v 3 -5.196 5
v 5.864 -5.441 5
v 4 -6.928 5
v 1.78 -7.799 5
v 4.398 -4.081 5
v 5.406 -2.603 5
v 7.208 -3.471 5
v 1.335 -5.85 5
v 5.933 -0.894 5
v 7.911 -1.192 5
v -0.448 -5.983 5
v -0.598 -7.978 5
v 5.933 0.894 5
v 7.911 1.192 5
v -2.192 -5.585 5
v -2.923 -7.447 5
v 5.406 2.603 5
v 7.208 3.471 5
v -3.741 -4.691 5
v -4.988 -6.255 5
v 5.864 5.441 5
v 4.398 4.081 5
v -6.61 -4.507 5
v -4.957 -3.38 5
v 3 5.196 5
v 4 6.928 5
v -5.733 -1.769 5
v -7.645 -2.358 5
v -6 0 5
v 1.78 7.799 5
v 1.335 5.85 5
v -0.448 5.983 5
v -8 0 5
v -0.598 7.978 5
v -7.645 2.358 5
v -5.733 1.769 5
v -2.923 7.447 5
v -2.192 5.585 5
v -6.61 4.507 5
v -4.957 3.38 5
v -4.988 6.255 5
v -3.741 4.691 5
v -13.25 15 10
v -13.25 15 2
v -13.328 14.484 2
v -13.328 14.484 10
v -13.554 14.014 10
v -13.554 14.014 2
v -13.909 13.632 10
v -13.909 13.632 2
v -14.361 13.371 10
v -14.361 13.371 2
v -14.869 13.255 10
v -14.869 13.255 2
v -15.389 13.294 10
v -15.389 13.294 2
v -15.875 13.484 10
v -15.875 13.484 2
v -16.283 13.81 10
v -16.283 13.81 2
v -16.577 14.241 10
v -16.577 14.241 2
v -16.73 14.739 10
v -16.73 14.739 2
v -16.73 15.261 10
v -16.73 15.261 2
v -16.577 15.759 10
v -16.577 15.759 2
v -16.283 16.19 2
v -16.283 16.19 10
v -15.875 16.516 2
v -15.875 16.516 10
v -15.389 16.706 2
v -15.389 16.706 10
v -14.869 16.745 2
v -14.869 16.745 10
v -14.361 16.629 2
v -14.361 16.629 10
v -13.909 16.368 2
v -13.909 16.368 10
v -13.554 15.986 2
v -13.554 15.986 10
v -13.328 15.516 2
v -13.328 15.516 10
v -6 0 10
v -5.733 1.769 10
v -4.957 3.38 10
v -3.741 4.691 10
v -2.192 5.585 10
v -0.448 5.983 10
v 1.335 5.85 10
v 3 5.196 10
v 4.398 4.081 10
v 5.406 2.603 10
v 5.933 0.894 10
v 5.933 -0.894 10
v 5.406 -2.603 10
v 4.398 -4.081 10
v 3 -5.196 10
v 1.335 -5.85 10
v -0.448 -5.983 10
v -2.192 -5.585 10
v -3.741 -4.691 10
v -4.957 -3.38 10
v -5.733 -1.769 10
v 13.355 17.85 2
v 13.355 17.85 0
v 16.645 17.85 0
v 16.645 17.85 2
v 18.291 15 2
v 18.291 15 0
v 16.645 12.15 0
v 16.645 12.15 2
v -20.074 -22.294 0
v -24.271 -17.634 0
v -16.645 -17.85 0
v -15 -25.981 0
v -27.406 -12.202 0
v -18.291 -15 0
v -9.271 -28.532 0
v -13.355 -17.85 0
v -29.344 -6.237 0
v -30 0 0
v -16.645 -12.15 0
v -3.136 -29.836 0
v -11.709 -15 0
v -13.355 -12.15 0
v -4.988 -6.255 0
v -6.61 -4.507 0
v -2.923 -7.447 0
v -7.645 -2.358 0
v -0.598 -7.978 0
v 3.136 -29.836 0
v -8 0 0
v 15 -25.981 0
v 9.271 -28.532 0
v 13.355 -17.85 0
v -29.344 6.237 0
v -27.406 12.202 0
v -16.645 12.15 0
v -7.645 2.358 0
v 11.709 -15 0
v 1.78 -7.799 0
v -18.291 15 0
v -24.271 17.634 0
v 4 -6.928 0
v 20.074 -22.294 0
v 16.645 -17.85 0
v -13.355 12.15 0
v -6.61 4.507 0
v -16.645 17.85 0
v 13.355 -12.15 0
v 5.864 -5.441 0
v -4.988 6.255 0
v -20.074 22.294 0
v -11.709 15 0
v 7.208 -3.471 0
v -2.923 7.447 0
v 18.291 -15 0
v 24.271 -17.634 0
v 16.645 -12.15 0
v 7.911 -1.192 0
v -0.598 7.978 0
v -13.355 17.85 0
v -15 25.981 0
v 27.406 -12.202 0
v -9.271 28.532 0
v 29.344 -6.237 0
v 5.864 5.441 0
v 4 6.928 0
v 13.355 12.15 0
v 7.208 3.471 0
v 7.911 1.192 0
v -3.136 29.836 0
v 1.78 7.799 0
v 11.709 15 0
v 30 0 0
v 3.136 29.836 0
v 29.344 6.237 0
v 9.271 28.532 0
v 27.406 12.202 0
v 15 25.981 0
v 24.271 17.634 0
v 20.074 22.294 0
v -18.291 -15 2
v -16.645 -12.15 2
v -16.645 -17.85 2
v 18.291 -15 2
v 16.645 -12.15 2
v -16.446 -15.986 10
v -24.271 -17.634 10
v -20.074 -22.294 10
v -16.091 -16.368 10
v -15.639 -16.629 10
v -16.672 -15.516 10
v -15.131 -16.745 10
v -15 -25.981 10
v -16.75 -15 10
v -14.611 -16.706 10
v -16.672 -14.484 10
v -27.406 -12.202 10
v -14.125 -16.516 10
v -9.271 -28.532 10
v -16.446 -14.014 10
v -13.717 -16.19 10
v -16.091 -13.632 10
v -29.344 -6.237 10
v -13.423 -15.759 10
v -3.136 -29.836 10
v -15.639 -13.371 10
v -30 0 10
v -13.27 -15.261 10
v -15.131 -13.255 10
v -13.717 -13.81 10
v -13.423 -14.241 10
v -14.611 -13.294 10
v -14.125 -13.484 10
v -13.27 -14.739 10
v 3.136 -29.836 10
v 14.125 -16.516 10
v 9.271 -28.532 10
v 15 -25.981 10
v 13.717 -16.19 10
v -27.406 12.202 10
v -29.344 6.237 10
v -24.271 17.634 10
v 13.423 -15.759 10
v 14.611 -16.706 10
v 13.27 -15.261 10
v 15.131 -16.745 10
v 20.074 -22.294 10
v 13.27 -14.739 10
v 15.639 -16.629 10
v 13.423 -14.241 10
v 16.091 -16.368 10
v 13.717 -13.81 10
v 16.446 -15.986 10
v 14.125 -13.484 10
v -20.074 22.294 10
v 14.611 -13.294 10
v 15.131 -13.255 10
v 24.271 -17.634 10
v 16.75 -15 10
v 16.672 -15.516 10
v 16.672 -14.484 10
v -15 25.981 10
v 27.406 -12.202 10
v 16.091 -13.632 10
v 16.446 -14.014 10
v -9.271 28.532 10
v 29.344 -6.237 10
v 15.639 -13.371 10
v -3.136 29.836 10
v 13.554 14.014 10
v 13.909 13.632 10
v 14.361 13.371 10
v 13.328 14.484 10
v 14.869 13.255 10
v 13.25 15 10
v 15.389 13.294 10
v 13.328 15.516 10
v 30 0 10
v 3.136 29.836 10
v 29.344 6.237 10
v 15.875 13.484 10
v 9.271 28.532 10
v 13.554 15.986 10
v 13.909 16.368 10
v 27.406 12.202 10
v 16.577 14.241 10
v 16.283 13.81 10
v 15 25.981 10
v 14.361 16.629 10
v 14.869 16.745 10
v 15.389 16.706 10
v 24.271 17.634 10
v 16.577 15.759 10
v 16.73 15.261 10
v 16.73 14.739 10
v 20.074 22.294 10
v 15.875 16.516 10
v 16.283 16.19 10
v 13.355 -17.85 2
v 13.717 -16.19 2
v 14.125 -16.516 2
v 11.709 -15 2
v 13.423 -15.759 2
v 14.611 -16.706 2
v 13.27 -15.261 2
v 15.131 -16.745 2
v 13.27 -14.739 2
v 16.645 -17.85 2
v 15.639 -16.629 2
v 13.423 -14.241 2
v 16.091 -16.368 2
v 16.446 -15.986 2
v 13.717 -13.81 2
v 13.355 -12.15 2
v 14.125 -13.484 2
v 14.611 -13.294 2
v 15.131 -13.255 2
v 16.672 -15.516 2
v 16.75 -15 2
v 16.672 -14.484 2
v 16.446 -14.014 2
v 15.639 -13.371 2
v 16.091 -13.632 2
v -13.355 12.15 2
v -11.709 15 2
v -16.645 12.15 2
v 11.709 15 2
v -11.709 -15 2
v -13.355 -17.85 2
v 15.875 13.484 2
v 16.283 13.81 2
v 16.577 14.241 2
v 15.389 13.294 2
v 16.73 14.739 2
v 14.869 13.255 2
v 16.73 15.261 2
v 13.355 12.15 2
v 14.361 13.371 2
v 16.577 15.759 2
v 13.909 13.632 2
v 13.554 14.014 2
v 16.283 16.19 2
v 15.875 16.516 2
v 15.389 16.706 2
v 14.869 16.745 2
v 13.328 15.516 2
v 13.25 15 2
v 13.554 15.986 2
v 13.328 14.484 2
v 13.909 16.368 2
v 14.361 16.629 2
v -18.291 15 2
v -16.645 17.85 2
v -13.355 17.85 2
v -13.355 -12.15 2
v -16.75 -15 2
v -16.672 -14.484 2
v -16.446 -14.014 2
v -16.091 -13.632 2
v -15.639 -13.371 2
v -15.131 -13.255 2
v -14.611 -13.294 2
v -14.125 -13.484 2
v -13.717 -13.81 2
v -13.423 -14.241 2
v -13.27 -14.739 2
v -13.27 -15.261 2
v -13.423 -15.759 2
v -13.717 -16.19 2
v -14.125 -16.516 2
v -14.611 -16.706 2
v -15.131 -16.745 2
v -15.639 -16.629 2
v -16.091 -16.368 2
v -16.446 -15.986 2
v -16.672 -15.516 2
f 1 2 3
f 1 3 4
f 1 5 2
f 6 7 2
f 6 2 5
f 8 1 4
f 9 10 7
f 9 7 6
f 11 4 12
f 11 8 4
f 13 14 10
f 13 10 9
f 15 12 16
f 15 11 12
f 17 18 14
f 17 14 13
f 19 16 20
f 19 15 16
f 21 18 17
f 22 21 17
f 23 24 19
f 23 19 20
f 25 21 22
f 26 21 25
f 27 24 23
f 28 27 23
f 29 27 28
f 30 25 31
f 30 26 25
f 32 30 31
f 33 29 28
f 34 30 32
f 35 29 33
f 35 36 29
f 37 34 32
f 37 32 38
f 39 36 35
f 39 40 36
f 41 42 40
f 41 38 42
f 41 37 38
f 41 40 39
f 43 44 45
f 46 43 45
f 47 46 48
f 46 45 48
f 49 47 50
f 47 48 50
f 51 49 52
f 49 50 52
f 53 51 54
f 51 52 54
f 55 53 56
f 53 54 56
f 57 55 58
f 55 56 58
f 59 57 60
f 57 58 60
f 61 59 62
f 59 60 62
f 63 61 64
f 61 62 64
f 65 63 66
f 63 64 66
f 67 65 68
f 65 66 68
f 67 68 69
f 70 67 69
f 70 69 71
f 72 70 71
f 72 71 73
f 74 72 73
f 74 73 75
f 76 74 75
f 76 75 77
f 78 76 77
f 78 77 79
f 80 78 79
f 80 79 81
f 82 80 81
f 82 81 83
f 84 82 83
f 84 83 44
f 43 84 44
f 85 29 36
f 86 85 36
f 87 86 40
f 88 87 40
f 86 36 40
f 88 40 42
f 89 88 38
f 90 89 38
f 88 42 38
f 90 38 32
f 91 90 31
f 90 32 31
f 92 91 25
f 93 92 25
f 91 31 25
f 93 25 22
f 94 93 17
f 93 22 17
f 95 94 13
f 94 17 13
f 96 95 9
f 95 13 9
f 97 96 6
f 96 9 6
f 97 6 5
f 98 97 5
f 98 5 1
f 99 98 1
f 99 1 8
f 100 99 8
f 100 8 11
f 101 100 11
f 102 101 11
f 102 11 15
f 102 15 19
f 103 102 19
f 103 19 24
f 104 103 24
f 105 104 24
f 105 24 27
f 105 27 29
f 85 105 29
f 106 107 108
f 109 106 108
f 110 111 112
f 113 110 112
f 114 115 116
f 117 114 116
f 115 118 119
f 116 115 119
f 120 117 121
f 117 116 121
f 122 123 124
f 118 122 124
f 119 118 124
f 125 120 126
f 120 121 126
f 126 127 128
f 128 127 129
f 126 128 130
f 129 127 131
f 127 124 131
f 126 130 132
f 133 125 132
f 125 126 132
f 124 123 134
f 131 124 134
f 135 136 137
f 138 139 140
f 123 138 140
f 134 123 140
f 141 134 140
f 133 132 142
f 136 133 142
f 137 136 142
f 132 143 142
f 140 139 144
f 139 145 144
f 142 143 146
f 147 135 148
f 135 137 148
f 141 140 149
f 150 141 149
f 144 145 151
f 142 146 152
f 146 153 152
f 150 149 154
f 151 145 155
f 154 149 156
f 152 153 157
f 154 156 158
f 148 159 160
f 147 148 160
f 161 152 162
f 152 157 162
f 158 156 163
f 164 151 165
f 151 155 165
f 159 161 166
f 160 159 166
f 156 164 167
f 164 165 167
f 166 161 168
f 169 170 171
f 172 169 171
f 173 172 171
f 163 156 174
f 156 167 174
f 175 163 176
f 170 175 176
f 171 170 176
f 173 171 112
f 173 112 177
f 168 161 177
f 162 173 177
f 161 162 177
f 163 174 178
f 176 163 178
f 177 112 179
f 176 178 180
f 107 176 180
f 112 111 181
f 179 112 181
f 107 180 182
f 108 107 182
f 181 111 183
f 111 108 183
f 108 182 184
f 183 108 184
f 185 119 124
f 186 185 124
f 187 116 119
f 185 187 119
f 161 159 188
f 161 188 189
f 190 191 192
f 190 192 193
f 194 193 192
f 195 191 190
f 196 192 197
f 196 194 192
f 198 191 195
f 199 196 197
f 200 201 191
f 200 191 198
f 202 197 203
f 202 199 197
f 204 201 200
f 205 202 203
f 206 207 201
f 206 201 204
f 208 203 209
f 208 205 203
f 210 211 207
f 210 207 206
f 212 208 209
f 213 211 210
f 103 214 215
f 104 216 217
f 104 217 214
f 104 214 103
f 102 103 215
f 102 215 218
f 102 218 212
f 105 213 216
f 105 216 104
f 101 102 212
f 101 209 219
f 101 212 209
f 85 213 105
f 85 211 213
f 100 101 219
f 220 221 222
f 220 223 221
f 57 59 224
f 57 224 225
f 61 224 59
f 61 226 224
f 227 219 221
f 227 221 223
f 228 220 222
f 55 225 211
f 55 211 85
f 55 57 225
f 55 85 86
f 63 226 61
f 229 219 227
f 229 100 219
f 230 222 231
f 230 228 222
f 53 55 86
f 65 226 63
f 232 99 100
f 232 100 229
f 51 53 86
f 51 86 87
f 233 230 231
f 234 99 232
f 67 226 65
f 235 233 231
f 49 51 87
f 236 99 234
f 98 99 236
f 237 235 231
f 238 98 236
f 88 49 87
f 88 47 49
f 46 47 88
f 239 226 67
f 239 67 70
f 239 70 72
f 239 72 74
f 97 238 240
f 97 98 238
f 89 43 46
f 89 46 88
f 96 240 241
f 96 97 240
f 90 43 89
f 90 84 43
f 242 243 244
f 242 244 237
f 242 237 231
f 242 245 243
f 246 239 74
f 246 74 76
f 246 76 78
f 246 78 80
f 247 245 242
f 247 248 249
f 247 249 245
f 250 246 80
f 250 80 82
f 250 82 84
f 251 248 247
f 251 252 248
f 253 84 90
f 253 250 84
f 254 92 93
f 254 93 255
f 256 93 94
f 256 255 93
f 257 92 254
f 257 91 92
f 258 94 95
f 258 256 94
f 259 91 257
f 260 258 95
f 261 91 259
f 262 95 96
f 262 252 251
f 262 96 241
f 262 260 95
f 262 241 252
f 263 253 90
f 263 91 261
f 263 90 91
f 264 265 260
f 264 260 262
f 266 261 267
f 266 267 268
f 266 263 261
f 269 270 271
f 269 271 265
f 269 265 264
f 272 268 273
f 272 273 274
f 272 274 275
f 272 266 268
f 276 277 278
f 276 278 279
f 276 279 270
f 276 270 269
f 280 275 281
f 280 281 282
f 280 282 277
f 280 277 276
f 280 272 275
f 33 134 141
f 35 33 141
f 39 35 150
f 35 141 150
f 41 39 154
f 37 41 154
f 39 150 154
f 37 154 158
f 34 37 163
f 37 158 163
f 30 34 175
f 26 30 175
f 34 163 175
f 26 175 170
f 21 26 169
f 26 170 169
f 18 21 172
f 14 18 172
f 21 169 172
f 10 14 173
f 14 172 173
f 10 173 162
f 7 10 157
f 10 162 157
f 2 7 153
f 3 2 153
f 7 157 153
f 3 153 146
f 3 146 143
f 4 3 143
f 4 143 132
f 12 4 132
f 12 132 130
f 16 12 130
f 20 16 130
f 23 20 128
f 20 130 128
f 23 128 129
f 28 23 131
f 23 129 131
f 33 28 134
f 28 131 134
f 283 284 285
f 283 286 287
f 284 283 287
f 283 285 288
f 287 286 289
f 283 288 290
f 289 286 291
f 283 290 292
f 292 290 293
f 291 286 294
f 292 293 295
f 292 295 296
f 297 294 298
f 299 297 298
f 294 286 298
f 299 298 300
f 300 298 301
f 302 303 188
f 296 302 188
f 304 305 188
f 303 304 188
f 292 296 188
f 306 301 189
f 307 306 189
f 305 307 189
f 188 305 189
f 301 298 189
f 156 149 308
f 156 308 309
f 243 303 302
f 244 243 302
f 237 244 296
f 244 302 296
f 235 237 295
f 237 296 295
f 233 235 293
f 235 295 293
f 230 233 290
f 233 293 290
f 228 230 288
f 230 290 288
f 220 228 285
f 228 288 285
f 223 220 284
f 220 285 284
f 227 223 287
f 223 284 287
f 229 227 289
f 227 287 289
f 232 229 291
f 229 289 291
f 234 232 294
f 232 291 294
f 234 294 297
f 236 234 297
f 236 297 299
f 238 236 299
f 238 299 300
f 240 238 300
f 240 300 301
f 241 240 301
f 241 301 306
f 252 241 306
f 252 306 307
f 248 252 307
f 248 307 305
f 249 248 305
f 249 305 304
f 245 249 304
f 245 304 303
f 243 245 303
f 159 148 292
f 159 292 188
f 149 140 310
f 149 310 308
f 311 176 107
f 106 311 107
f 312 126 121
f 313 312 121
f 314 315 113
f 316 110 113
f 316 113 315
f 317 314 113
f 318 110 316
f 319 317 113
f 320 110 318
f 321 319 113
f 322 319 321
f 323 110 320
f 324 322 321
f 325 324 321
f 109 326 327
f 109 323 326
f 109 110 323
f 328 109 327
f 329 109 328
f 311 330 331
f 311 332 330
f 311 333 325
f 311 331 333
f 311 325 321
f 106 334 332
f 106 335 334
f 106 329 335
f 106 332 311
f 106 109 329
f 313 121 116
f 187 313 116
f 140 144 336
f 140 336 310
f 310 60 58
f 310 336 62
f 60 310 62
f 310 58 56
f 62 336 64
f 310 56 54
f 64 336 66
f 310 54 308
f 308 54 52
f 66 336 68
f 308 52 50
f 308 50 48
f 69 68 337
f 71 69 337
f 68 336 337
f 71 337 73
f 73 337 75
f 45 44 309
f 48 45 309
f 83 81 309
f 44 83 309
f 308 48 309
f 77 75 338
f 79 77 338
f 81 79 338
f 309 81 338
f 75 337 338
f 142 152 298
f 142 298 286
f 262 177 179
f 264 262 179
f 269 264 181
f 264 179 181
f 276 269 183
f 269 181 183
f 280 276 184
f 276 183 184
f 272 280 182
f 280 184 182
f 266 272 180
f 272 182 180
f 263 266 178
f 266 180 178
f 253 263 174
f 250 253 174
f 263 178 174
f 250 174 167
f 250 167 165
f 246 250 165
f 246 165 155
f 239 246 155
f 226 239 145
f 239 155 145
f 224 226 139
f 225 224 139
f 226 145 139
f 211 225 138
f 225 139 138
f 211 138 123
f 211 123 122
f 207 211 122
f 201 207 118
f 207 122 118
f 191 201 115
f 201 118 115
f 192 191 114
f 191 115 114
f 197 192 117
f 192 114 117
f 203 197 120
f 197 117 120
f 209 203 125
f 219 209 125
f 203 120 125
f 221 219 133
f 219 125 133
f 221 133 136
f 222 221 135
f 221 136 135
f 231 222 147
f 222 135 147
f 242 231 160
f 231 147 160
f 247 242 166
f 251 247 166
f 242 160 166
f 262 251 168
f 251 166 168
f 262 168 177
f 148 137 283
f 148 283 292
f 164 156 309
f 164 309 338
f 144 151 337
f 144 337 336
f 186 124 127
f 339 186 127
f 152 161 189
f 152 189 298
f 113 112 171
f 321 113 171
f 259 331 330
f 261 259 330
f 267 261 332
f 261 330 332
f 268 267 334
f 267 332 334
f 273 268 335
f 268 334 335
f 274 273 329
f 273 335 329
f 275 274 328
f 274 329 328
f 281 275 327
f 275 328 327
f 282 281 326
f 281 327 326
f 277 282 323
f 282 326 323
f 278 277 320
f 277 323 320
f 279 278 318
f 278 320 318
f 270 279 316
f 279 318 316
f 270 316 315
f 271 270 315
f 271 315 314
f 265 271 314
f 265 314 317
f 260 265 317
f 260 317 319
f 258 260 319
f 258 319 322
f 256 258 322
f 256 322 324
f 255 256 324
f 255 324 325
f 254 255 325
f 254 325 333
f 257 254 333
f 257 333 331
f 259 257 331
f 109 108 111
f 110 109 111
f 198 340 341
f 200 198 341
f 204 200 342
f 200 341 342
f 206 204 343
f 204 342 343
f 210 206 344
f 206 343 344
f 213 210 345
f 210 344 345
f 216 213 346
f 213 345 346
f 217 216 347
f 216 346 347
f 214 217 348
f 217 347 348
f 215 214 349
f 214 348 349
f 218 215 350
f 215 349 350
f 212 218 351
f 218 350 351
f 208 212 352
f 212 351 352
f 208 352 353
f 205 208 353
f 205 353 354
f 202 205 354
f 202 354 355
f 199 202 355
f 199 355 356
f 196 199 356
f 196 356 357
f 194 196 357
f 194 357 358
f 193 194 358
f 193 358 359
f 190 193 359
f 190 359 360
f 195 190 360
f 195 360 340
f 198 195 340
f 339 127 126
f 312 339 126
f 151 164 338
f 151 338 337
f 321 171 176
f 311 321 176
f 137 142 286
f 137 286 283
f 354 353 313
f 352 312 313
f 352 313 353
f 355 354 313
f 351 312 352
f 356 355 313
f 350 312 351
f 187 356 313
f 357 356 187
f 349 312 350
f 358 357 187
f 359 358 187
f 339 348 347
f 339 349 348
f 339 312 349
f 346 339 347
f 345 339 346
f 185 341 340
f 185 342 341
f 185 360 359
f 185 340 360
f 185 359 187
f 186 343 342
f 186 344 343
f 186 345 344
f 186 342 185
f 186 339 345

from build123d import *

# Parameters (mm, degrees)
SKETCH1_R           = 30
BOSS_EXTRUDE1_DEPTH = 10
SKETCH2_R           = 6
CUT_EXTRUDE1_DEPTH  = 44.588989435
SKETCH3_R           = 8
CUT_EXTRUDE2_DEPTH  = 5
SKETCH4_R           = 1.75
CUT_EXTRUDE3_DEPTH  = 44.588989435
CUT_EXTRUDE4_DEPTH  = 2


with BuildPart() as part:
    # Sketch1 → Boss-Extrude1 (new body)
    with BuildSketch(Plane.XY):
        Circle(SKETCH1_R)
    extrude(amount=BOSS_EXTRUDE1_DEPTH)

    # Sketch2 → Cut-Extrude1 (cut, through all)
    with BuildSketch(Plane(origin=(0, 0, 0), x_dir=(-1, 0, 0), z_dir=(0, 0, -1))):
        Circle(SKETCH2_R)
    extrude(amount=-CUT_EXTRUDE1_DEPTH, mode=Mode.SUBTRACT)

    # Sketch3 → Cut-Extrude2 (cut)
    with BuildSketch(Plane(origin=(0, 0, 0), x_dir=(-1, 0, 0), z_dir=(0, 0, -1))):
        Circle(SKETCH3_R)
    extrude(amount=-CUT_EXTRUDE2_DEPTH, mode=Mode.SUBTRACT)

    # Sketch4 → Cut-Extrude3 (cut, through all)
    with BuildSketch(Plane(origin=(0, 0, 0), x_dir=(-1, 0, 0), z_dir=(0, 0, -1))):
        with Locations((-15, 15)):
            Circle(SKETCH4_R)
        with Locations(Location((15, 15, 0), (0, 0, 180))):
            Circle(SKETCH4_R)
        with Locations((15, -15)):
            Circle(SKETCH4_R)
        with Locations(Location((-15, -15, 0), (0, 0, 180))):
            Circle(SKETCH4_R)
    extrude(amount=-CUT_EXTRUDE3_DEPTH, mode=Mode.SUBTRACT)

    # Sketch5 → Cut-Extrude4 (cut)
    with BuildSketch(Plane(origin=(0, 0, 0), x_dir=(-1, 0, 0), z_dir=(0, 0, -1))):
        Polygon((-11.709103466, 15), (-13.354551733, 17.85), (-16.645448267, 17.85), (-18.290896534, 15), (-16.645448267, 12.15), (-13.354551733, 12.15), align=None)
        Polygon((13.354551733, 12.15), (11.709103466, 15), (13.354551733, 17.85), (16.645448267, 17.85), (18.290896534, 15), (16.645448267, 12.15), align=None)
        Polygon((11.709103466, -15), (13.354551733, -17.85), (16.645448267, -17.85), (18.290896534, -15), (16.645448267, -12.15), (13.354551733, -12.15), align=None)
        Polygon((-13.354551733, -12.15), (-11.709103466, -15), (-13.354551733, -17.85), (-16.645448267, -17.85), (-18.290896534, -15), (-16.645448267, -12.15), align=None)
    extrude(amount=-CUT_EXTRUDE4_DEPTH, mode=Mode.SUBTRACT)


solid = part.part
